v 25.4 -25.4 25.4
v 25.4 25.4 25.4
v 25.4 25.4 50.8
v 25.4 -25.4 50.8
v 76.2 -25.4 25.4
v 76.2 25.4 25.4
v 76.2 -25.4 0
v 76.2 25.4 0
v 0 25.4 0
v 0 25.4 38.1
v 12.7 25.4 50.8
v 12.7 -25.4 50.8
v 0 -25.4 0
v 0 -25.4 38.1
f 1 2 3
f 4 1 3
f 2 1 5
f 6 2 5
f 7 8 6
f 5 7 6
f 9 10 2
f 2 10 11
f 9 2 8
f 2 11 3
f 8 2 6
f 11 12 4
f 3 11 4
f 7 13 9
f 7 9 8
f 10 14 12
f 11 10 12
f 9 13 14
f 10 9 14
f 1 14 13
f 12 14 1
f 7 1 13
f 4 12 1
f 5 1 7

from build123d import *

# Parameters (mm, degrees)
F0_W          = 76.2
F0_H          = 50.8
F1_DEPTH      = 25.4
F3_DEPTH      = 25.4
F4_W          = 50.8
F4_H          = 25.4
F5_DEPTH      = 25.4
F5_DEPTH_BACK = 87.34144


with BuildPart() as f1:
    # F0 (on Front) → F1 (new body, symmetric)
    with BuildSketch(Plane.XZ):
        with Locations((38.1, 25.4)):
            Rectangle(F0_W, F0_H)
    extrude(amount=F1_DEPTH, both=True)

    # F2 (on Front) → F3 (cut, symmetric)
    with BuildSketch(Plane.XZ):
        Polygon((0, 50.8), (0, 38.1), (12.7, 50.8), align=None)
    extrude(amount=F3_DEPTH, both=True, mode=Mode.SUBTRACT)

    # F4 (on Front) → F5 (cut, two sides)
    with BuildSketch(Plane.XZ) as f5_sk:
        with Locations((50.8, 38.1)):
            Rectangle(F4_W, F4_H)
    extrude(amount=F5_DEPTH, mode=Mode.SUBTRACT)
    extrude(f5_sk.sketch, amount=-F5_DEPTH_BACK, mode=Mode.SUBTRACT)


solid = f1.part
